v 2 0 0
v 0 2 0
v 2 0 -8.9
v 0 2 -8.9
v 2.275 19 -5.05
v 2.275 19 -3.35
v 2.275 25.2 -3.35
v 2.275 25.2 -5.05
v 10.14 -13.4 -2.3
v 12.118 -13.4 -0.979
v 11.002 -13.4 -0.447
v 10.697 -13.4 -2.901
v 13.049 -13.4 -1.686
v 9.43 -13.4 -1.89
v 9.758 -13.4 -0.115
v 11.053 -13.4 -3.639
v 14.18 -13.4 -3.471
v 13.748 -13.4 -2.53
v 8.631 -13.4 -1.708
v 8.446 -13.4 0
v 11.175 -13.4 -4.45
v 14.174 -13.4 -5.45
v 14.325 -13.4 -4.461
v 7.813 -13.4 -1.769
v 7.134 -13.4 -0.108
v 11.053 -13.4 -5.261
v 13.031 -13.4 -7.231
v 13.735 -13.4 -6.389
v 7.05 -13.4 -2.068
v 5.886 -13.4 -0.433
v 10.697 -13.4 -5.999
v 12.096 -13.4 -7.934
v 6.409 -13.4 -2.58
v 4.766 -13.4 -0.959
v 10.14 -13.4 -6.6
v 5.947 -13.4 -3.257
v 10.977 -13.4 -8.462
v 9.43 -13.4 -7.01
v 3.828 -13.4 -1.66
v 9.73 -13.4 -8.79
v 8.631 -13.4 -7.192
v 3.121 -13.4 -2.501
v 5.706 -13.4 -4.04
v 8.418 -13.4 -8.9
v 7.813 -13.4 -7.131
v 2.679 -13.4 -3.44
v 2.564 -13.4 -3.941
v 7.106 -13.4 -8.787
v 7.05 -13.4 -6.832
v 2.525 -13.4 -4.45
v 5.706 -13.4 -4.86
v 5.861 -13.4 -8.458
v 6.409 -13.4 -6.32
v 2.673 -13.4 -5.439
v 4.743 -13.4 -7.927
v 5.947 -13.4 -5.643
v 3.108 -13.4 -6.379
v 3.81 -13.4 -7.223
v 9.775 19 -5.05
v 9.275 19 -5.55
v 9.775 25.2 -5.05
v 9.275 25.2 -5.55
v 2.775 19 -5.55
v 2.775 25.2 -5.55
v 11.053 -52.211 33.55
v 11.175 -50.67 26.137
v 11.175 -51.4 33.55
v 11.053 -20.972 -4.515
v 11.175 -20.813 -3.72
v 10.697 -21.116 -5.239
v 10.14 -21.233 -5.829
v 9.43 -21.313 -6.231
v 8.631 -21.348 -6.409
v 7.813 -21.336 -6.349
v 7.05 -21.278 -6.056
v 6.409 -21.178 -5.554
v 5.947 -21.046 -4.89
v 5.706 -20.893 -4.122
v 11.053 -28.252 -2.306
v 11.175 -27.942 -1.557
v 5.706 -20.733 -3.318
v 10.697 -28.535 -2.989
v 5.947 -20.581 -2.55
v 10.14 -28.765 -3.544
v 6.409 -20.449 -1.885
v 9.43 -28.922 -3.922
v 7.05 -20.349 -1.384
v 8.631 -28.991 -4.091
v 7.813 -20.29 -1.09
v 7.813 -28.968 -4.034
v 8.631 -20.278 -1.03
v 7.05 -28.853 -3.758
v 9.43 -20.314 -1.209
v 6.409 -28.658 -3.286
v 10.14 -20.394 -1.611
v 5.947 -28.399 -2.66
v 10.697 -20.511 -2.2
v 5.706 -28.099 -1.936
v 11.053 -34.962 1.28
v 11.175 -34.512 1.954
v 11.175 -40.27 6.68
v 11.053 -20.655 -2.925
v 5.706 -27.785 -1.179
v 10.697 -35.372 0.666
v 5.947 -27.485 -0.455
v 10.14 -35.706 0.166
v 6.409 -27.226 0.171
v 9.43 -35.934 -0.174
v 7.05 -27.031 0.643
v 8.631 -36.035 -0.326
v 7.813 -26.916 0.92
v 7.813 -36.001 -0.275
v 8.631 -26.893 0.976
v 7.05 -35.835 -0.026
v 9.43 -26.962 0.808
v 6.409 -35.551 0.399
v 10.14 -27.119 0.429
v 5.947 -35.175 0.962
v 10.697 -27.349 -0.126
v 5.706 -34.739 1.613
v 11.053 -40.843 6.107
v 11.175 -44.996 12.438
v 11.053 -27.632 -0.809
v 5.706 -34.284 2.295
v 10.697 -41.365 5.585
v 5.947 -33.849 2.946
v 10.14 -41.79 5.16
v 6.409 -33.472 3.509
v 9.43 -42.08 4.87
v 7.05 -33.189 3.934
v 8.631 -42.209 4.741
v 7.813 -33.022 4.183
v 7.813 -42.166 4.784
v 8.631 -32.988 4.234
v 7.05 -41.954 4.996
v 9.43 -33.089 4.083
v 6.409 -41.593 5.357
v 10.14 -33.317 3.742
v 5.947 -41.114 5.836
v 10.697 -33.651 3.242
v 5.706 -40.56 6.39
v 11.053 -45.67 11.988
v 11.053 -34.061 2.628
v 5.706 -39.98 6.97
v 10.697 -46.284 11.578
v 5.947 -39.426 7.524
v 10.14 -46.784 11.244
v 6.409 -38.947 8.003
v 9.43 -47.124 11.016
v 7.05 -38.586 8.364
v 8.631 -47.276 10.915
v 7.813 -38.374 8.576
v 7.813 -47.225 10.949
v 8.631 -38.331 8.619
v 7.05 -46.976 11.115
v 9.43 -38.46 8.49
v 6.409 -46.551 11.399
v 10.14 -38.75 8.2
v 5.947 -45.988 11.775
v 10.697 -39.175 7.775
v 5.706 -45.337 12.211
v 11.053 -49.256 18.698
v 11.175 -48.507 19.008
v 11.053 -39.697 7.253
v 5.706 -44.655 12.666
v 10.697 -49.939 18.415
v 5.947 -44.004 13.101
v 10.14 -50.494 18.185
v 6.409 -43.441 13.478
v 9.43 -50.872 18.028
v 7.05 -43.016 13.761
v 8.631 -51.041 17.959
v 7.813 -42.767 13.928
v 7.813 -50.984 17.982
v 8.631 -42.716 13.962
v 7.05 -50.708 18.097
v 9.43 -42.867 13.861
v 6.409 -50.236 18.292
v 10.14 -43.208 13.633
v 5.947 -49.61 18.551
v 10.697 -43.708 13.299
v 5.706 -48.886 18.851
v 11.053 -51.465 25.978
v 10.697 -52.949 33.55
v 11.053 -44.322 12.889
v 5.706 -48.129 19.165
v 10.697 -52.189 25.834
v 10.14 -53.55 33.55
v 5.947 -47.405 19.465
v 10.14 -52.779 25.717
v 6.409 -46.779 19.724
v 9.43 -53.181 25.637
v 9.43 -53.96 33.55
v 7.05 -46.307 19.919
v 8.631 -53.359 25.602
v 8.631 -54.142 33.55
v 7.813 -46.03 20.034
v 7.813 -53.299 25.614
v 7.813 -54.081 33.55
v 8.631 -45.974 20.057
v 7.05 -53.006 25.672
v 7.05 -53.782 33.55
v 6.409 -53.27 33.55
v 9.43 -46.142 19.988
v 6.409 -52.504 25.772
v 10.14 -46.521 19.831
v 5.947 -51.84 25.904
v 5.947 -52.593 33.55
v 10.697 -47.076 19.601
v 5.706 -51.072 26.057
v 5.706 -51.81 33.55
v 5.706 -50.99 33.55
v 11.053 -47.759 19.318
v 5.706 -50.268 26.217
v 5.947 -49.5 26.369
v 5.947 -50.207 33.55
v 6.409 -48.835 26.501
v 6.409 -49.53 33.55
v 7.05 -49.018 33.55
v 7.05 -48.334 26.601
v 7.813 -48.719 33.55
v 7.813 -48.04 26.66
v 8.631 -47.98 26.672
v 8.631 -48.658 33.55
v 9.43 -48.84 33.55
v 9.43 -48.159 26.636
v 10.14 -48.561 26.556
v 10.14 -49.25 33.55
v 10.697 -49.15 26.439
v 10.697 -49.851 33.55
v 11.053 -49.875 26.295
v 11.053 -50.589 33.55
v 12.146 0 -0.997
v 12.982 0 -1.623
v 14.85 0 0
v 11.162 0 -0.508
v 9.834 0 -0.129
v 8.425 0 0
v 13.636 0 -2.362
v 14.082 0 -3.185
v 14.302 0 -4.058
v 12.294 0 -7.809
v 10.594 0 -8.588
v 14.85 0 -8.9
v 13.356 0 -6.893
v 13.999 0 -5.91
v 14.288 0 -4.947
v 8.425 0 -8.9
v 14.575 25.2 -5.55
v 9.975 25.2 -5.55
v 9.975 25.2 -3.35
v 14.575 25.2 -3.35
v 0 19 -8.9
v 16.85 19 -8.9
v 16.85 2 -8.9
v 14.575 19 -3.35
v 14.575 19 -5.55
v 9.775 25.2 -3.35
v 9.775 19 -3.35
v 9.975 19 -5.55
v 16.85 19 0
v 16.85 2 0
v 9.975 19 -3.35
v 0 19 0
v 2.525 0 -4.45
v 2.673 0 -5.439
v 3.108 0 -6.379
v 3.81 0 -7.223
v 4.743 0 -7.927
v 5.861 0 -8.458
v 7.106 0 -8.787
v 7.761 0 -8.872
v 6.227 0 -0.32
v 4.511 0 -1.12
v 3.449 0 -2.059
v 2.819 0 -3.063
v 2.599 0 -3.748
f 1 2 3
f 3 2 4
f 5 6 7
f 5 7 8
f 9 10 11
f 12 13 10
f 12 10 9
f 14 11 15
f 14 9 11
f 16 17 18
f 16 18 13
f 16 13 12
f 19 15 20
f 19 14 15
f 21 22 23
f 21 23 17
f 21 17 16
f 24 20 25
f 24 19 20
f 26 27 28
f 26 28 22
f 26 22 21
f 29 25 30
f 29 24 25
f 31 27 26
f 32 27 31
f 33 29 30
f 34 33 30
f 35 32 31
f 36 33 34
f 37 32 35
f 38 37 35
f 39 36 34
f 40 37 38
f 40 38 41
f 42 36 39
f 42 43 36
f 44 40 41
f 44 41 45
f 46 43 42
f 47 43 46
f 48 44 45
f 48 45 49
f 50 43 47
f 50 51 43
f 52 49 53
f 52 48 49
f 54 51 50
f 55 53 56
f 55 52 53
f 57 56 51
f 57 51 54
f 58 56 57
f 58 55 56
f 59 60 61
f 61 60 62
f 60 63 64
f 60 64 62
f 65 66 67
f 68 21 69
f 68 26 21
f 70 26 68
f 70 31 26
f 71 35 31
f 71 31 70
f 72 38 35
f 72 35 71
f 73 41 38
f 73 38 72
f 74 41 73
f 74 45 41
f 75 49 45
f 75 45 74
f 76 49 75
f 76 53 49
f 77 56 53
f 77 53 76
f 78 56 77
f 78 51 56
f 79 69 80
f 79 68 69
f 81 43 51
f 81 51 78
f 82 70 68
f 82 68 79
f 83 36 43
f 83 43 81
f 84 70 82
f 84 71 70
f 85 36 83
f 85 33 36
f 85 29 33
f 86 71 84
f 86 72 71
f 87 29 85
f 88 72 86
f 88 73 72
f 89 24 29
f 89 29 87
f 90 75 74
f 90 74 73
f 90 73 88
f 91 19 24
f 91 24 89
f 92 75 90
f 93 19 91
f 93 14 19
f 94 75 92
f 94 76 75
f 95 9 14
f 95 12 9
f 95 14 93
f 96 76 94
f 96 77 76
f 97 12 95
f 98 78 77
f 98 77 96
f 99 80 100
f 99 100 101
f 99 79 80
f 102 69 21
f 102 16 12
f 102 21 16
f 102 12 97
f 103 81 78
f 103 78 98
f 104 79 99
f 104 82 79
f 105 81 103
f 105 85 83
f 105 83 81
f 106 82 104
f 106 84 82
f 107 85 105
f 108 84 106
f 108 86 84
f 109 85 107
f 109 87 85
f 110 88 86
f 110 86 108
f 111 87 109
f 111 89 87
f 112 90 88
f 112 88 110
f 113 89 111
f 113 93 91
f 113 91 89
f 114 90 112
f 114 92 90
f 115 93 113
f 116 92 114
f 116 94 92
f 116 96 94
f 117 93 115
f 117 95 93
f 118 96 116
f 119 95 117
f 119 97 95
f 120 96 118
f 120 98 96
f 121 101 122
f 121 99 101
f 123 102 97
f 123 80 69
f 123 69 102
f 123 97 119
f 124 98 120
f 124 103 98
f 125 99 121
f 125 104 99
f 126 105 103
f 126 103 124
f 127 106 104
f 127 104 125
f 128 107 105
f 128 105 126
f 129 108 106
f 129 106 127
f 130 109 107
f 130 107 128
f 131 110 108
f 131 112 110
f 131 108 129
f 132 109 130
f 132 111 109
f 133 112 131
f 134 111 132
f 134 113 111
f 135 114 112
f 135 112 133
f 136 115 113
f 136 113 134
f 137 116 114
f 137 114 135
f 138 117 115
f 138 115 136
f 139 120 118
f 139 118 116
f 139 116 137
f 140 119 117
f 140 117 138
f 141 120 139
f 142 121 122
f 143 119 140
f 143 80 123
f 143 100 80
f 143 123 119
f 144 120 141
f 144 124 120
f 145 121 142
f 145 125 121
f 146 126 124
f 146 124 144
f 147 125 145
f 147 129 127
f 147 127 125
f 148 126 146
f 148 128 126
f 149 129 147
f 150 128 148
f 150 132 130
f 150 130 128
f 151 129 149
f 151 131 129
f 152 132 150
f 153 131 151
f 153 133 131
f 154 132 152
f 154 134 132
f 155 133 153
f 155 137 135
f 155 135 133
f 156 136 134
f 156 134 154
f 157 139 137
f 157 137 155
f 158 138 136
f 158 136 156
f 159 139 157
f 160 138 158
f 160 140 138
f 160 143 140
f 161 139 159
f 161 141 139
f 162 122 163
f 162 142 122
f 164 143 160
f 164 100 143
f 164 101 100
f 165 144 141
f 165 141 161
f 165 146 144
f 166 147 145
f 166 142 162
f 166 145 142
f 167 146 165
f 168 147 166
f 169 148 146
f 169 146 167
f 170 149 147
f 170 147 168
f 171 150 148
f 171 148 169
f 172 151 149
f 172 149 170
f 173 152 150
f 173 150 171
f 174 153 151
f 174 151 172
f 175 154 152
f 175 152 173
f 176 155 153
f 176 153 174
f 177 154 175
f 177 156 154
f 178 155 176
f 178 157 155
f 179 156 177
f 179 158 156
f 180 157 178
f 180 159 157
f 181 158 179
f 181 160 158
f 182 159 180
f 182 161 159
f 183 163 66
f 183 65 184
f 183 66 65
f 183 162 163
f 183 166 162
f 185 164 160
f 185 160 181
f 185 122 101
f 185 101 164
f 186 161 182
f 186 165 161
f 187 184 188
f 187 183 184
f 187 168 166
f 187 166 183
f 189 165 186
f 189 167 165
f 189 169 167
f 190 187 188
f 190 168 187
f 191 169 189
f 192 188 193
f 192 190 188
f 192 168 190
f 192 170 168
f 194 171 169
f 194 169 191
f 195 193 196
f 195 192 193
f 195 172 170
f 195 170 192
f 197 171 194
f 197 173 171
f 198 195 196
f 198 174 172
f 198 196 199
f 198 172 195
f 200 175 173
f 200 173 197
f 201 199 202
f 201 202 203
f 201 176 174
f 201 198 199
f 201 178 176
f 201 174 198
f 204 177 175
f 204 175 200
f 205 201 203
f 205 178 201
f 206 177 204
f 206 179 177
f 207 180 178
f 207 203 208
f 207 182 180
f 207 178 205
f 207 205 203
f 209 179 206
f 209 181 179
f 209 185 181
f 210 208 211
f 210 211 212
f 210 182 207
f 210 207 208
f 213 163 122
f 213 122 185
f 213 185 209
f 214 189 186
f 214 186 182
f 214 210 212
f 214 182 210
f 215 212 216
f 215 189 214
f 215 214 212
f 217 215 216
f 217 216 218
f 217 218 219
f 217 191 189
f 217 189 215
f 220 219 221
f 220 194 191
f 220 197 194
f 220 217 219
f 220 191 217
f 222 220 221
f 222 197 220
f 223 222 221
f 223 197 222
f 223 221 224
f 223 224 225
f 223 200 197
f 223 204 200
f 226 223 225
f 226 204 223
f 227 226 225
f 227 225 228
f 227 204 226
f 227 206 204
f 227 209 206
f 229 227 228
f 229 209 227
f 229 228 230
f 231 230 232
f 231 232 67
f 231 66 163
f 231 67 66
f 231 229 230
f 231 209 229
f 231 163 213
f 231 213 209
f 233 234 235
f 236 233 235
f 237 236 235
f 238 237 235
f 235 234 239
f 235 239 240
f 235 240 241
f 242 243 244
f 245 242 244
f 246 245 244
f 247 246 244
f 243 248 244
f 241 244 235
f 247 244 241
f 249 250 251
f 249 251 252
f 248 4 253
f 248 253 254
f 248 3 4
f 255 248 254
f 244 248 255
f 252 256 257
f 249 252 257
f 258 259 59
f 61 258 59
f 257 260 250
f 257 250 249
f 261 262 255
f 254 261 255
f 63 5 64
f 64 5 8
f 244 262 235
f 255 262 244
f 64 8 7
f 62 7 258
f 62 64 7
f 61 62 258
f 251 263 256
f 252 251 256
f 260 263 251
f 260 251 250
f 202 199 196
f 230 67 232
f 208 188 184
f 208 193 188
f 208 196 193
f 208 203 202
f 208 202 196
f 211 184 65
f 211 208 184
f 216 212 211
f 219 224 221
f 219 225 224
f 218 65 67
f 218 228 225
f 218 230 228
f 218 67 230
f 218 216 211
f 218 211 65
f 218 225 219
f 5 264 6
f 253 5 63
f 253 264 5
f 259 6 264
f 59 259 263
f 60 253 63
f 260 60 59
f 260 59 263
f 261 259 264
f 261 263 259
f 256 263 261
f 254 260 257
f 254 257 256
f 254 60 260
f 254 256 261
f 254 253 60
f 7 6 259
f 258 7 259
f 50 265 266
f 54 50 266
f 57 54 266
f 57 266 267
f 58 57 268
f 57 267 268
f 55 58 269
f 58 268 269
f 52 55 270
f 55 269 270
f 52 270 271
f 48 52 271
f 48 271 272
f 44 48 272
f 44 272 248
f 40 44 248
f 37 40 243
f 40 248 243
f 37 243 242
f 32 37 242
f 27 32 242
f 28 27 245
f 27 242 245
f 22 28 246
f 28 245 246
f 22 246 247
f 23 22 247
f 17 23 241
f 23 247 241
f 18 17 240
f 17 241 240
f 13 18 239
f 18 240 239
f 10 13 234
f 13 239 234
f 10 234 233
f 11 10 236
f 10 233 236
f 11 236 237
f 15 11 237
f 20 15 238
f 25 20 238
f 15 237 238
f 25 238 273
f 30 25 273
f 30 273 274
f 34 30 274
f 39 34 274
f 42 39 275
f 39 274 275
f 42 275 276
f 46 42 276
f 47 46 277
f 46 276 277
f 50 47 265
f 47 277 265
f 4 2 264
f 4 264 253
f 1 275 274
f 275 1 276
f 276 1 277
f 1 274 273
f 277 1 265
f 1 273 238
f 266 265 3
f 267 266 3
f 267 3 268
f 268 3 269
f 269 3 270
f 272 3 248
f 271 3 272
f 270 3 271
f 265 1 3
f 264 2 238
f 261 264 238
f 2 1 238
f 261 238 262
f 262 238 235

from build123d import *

# Parameters (mm, degrees)
SKETCH1_W           = 16.85
SKETCH1_H           = 8.9
BOSS_EXTRUDE1_DEPTH = 19
SKETCH2_W           = 7.5
SKETCH2_H           = 2.2
SKETCH2_W_2         = 4.6
BOSS_EXTRUDE2_DEPTH = 6.2
CHAMFER1_SIZE       = 0.5
SKETCH3_RX          = 5.9
SKETCH3_RY          = 4.45
BOSS_EXTRUDE3_DEPTH = 13.4
CHAMFER2_SIZE       = 2
SKETCH4_R           = 2.75


with BuildPart() as part:
    # Sketch1 → Boss-Extrude1 (new body)
    with BuildSketch(Plane(origin=(0, 0, 0), x_dir=(1, 0, 0), z_dir=(0, 1, 0))):
        with Locations((8.425, 4.45)):
            Rectangle(SKETCH1_W, SKETCH1_H)
    extrude(amount=BOSS_EXTRUDE1_DEPTH)

    # Sketch2 → Boss-Extrude2 (add)
    with BuildSketch(Plane(origin=(0, 19, 0), x_dir=(1, 0, 0), z_dir=(0, 1, 0))):
        with Locations((6.025, 4.45)):
            Rectangle(SKETCH2_W, SKETCH2_H)
        with Locations((12.275, 4.45)):
            Rectangle(SKETCH2_W_2, SKETCH2_H)
    extrude(amount=BOSS_EXTRUDE2_DEPTH)

    # Chamfer1
    chamfer1_edges = [part.edges().sort_by_distance(p)[0] for p in [
        (2.275, 22.1, -5.55),
        (9.775, 22.1, -5.55),
    ]]
    chamfer(chamfer1_edges, length=CHAMFER1_SIZE)

    # Sketch3 → Boss-Extrude3 (add)
    with BuildSketch(Plane.XZ):
        with Locations(Location((8.425, -4.45), (0, 0, 180))):
            Ellipse(SKETCH3_RX, SKETCH3_RY)
    extrude(amount=BOSS_EXTRUDE3_DEPTH)

    # Chamfer2
    chamfer2_edges = [part.edges().sort_by_distance(p)[0] for p in [
        (16.85, 0, -4.45),
        (0, 0, -4.45),
    ]]
    chamfer(chamfer2_edges, length=CHAMFER2_SIZE)

    # Sweep2: sweep along a path in Sketch6
    with BuildLine(Plane(origin=(0, 0, 0), x_dir=(0, 0, -1), z_dir=(1, 0, 0))) as sweep2_path:
        ThreePointArc((4.45, -13.4), (-6.679942315, -40.270057685), (-33.55, -51.4))
    # Sketch4 → Sweep2 (sweep)
    with BuildSketch(Plane.XZ.offset(13.4)):
        with Locations((8.425, -4.45)):
            Circle(SKETCH4_R)
    sweep(path=sweep2_path.line)


solid = part.part
